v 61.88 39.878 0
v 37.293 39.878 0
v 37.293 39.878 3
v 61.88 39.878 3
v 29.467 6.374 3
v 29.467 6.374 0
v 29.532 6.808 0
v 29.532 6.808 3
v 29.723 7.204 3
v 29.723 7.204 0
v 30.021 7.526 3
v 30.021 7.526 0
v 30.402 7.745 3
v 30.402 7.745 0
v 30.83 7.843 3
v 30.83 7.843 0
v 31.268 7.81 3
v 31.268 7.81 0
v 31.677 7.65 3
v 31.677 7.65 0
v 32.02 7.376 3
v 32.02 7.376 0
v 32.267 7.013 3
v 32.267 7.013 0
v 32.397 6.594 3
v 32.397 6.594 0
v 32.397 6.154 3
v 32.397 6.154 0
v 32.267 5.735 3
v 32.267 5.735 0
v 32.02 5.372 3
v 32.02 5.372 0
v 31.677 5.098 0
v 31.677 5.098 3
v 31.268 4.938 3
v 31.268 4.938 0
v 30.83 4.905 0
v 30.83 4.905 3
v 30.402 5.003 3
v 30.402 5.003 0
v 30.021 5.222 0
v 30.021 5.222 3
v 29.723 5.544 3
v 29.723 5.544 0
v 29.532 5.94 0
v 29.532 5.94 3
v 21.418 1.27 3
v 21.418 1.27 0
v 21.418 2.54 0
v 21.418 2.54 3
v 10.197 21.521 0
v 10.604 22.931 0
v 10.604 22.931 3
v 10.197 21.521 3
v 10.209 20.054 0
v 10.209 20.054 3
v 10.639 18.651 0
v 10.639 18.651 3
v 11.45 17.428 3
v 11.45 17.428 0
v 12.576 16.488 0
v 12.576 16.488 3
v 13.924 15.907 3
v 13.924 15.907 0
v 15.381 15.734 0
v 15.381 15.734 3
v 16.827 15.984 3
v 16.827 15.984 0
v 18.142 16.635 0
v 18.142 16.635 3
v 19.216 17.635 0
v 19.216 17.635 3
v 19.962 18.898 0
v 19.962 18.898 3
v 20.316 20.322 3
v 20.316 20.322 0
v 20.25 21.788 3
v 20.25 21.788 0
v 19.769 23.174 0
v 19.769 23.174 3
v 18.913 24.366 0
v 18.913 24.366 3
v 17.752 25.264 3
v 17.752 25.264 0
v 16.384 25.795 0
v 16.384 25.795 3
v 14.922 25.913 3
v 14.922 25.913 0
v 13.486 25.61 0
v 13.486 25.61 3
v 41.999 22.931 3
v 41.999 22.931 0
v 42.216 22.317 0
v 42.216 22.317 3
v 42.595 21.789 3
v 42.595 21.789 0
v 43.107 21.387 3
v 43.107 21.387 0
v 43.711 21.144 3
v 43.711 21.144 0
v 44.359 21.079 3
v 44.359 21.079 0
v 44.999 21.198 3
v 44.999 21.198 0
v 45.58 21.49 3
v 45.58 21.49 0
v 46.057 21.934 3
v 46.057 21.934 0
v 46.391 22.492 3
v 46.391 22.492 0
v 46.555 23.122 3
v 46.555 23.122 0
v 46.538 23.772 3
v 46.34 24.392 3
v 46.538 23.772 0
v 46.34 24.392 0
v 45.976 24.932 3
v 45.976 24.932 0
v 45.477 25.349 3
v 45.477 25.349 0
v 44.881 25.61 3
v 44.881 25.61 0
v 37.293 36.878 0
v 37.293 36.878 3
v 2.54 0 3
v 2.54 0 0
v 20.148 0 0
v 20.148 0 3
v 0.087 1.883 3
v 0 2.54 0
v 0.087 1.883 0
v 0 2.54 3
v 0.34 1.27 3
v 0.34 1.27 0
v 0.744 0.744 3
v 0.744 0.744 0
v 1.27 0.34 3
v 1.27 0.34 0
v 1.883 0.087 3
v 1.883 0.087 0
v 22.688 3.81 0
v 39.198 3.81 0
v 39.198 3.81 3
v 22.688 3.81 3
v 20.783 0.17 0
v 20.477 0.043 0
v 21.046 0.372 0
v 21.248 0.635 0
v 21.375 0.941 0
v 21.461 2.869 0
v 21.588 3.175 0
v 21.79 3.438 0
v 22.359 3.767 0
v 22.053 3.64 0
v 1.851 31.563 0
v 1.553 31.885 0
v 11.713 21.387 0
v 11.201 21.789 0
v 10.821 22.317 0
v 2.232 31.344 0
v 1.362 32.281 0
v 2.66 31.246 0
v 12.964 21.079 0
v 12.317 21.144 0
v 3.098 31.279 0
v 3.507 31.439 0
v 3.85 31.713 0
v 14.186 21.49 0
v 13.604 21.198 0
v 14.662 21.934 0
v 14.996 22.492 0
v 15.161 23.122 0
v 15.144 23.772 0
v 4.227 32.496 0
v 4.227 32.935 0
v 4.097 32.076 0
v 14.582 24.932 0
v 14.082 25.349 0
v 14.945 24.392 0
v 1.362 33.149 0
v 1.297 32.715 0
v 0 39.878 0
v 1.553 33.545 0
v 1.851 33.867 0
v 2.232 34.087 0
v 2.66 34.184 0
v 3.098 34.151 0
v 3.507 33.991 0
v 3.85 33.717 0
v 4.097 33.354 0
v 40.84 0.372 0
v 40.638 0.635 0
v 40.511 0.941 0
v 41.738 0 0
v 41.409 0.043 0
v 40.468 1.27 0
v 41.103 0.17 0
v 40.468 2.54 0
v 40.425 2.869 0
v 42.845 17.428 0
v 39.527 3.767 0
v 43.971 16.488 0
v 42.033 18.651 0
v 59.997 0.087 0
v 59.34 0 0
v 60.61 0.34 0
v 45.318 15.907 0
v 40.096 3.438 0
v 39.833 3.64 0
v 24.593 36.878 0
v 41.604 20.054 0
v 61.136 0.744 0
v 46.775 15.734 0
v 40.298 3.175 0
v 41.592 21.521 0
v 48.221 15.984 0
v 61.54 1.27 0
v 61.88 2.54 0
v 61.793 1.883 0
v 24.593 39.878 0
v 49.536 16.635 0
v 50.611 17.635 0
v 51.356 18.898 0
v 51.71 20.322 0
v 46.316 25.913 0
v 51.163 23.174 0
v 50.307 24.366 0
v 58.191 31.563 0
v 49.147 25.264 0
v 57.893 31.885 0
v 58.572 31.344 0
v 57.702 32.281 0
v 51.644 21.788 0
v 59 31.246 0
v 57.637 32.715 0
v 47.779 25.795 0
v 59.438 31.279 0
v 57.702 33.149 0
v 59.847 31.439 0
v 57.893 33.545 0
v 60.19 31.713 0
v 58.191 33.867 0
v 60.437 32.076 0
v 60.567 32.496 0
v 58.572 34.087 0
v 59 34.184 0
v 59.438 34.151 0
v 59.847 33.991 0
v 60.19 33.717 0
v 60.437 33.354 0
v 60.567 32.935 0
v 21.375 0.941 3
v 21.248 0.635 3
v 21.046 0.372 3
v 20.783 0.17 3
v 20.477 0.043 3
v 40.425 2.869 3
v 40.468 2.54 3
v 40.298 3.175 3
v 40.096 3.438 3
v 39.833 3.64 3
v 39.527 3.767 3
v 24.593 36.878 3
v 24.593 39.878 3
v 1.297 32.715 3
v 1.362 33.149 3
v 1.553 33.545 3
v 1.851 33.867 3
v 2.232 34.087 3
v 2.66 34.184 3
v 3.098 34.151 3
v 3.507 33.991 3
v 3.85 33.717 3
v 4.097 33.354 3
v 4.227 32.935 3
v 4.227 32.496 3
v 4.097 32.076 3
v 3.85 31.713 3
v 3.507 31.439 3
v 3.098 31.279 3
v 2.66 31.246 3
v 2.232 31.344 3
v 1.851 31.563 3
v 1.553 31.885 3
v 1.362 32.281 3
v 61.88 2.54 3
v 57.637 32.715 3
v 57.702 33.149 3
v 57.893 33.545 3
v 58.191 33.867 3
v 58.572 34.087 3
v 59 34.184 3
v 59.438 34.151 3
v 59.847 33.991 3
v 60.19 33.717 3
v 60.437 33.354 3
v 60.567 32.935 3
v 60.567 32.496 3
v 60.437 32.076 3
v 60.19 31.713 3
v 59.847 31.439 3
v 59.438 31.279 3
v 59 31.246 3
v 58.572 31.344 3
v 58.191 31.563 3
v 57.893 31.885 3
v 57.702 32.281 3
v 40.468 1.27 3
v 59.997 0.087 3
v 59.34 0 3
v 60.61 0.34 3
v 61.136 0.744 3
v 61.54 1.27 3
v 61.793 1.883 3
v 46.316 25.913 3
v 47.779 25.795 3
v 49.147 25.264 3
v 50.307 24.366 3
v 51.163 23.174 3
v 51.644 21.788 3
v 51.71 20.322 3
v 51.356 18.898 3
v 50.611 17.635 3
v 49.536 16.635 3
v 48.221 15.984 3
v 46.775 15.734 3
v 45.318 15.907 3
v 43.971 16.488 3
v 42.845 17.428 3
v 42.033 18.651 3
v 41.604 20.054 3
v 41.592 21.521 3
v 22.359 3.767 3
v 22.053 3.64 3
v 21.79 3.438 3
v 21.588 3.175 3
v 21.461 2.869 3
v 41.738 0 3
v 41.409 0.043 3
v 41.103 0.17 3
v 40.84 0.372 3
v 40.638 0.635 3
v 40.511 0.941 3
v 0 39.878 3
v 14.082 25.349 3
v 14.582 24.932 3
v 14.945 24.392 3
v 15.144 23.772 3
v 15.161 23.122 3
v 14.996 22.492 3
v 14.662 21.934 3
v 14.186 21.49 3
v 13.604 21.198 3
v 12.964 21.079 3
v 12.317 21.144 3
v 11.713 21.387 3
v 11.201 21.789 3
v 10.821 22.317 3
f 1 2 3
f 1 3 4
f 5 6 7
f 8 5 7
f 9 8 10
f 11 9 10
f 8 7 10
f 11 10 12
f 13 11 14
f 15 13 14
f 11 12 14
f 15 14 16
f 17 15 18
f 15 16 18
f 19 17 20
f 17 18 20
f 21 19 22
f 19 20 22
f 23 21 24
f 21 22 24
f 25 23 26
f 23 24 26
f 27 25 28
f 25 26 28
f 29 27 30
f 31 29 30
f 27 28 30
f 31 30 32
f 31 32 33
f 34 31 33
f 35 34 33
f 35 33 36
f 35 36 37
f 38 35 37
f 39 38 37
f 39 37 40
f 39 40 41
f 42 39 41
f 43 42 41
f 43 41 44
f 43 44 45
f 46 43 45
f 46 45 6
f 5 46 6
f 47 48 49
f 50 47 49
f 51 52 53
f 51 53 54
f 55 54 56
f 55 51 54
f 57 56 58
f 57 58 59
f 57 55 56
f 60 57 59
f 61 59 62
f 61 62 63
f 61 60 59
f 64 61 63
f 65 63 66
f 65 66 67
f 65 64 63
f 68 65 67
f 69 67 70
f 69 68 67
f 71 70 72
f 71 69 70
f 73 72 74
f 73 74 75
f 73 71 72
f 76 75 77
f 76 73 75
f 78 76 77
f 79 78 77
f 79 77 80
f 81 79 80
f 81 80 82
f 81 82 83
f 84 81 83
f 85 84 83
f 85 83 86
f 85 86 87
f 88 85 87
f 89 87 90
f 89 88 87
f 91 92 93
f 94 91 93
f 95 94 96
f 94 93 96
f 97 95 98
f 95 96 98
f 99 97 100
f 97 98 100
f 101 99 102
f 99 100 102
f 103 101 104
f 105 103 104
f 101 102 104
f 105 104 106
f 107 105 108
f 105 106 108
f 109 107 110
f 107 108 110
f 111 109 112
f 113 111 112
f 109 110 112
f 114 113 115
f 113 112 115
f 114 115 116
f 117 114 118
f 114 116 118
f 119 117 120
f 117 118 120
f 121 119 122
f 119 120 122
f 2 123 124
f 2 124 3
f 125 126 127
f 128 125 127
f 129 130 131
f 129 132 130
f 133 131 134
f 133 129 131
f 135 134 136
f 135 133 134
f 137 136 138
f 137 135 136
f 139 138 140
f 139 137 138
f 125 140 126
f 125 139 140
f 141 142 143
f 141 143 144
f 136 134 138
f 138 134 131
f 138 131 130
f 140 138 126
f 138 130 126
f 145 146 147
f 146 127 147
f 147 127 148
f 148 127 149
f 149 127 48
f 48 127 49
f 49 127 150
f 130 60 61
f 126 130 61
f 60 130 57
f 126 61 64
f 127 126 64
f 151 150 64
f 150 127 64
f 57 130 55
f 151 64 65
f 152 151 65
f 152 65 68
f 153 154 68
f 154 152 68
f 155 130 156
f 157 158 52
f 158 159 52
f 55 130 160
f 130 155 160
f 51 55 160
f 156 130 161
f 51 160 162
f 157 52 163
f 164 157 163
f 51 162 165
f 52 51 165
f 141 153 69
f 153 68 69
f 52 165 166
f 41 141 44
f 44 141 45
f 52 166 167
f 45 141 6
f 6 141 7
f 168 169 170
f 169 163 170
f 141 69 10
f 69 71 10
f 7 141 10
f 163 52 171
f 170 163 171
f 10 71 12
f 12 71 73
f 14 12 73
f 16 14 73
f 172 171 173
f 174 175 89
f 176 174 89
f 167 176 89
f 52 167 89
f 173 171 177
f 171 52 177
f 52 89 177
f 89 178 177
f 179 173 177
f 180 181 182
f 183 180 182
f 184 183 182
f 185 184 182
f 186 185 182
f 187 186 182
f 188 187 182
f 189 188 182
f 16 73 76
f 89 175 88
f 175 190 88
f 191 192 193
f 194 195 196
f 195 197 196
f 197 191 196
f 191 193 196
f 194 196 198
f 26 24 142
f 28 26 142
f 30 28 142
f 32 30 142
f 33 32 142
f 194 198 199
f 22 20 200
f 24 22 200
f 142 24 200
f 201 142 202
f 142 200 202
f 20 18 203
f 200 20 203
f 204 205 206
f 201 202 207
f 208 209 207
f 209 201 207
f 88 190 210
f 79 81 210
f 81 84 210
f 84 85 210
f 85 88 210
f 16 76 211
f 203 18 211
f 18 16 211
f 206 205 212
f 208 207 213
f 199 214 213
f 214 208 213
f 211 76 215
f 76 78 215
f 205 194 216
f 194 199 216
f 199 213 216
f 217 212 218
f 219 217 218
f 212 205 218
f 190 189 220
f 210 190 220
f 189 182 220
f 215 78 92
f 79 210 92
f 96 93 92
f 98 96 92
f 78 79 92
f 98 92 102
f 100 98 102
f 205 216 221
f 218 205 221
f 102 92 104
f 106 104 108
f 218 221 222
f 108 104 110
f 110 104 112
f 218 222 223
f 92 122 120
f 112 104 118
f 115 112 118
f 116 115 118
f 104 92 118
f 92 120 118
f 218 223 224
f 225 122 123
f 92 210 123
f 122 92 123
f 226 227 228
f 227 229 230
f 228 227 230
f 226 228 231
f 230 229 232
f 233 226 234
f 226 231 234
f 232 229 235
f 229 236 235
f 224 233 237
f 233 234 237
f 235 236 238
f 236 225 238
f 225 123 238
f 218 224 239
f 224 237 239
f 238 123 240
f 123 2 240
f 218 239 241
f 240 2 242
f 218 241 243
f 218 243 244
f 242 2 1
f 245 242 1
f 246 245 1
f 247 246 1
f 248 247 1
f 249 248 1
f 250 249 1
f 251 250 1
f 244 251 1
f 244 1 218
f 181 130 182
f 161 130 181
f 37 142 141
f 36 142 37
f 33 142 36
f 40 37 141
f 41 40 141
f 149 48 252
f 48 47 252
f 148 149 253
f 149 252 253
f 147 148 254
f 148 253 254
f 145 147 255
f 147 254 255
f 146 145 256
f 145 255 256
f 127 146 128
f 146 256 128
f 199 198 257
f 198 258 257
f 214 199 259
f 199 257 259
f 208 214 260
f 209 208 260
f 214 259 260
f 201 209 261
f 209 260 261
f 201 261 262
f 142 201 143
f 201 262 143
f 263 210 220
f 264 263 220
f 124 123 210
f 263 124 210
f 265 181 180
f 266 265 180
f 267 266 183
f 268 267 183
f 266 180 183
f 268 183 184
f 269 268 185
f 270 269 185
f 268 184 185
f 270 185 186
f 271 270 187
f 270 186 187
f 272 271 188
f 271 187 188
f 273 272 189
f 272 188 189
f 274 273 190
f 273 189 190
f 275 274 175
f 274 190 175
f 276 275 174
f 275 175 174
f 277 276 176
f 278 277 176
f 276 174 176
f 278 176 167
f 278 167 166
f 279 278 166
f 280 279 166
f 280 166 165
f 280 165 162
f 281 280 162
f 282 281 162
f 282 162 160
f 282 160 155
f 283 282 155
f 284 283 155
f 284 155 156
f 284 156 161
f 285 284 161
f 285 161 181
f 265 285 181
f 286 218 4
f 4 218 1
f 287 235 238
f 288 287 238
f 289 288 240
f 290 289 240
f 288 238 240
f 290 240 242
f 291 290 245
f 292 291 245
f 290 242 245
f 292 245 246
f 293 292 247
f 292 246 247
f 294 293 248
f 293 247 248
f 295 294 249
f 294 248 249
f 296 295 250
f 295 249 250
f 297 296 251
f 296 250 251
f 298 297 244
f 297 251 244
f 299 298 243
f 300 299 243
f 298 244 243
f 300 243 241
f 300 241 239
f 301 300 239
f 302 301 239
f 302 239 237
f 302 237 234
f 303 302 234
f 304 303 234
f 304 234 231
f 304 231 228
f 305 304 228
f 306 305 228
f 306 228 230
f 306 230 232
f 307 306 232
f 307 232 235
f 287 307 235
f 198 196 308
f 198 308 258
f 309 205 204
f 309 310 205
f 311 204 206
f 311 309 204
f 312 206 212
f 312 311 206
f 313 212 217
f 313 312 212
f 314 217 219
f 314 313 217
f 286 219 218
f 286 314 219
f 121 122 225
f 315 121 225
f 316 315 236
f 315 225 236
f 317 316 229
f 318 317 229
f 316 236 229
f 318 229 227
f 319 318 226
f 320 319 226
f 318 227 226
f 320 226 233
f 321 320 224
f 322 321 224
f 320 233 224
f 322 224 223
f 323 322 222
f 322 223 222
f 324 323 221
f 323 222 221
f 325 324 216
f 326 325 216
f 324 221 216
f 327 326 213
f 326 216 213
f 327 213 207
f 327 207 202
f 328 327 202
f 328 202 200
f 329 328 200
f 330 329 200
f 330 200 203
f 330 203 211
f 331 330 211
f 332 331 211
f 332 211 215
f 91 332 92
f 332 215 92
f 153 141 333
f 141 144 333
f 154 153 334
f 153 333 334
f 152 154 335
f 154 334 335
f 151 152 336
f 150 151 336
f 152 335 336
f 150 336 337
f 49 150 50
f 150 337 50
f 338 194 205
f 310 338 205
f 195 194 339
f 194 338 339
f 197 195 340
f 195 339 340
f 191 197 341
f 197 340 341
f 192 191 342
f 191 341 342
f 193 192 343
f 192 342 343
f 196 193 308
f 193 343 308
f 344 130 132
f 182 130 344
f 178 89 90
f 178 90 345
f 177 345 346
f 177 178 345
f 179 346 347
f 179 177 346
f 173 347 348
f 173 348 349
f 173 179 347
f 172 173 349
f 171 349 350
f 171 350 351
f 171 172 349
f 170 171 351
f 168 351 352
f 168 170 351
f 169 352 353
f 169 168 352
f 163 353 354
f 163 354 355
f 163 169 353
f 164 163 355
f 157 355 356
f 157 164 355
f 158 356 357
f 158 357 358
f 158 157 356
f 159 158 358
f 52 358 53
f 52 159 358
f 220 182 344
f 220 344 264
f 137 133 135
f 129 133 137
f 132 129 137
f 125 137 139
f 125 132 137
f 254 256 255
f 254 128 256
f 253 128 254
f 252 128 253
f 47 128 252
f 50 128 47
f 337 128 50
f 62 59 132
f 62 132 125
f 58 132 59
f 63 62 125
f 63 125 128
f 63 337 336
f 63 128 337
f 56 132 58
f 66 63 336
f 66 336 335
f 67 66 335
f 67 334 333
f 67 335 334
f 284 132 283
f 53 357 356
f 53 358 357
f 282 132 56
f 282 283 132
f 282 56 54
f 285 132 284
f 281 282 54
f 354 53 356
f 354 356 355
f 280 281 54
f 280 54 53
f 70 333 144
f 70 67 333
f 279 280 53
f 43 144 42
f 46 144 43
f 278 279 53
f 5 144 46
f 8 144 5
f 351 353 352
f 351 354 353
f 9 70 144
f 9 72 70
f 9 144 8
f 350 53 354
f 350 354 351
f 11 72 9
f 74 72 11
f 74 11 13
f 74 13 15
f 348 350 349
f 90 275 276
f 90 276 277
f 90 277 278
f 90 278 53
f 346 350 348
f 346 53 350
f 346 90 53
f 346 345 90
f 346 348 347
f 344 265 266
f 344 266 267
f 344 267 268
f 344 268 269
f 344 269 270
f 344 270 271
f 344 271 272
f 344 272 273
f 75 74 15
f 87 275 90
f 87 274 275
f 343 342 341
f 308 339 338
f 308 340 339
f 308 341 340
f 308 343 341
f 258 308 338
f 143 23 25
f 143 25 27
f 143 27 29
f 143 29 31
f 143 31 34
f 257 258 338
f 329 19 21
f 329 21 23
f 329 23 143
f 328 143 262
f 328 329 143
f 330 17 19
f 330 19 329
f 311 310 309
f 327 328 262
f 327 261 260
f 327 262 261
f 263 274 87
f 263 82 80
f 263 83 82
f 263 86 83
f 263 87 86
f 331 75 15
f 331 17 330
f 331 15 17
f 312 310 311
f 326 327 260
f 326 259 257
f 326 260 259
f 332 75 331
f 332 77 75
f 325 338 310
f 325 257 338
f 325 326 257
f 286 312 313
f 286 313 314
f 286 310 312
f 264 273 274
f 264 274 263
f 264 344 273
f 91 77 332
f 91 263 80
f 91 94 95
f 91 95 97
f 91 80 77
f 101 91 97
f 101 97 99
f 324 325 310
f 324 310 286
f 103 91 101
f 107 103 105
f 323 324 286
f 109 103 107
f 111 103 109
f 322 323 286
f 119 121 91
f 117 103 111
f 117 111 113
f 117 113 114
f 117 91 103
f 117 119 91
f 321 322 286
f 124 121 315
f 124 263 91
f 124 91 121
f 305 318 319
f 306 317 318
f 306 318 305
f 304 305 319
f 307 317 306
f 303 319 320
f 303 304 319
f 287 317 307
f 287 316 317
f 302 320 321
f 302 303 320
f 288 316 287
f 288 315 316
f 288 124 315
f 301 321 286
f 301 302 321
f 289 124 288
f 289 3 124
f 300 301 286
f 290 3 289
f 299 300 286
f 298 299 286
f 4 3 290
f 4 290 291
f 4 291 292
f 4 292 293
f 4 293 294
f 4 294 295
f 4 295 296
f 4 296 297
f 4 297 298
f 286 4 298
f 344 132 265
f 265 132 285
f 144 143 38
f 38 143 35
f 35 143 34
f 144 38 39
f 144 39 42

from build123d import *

# Parameters (mm, degrees)
SKETCH1_W                   = 61.88
SKETCH1_H                   = 39.878
BOSS_EXTRUDE1_DEPTH         = 3
F_32_0_116_DIAMETER_HOLE1_D = 2.9464
FILLET1_R                   = 2.54
SKETCH6_W                   = 12.7
SKETCH6_H                   = 3
CUT_EXTRUDE1_DEPTH          = 3
SKETCH7_W                   = 19.05
SKETCH7_H                   = 3.81
CUT_EXTRUDE2_DEPTH          = 74.67760368
FILLET2_R                   = 1.27
CUT_EXTRUDE4_DEPTH          = 3


with BuildPart() as part:
    # Sketch1 → Boss-Extrude1 (new body)
    with BuildSketch(Plane.XY):
        with Locations((30.94, 19.939)):
            Rectangle(SKETCH1_W, SKETCH1_H)
    extrude(amount=BOSS_EXTRUDE1_DEPTH)

    # #32 (0.116) Diameter Hole1 (through all)
    with Locations(Plane.XY.offset(3)):
        with Locations((30.94, 6.373999952), (59.11, 32.7152), (2.77, 32.7152)):
            Hole(F_32_0_116_DIAMETER_HOLE1_D / 2)

    # Fillet1
    fillet1_edges = [part.edges().sort_by_distance(p)[0] for p in [
        (61.88, 0, 1.5),
        (0, 0, 1.5),
    ]]
    fillet(fillet1_edges, radius=FILLET1_R)

    # Sketch6 → Cut-Extrude1 (cut)
    with BuildSketch(Plane(origin=(0, 0, 0), x_dir=(-1, 0, 0), z_dir=(0, 0, -1))):
        with Locations((-30.9428, 38.378)):
            Rectangle(SKETCH6_W, SKETCH6_H)
    extrude(amount=-CUT_EXTRUDE1_DEPTH, mode=Mode.SUBTRACT)

    # Sketch7 → Cut-Extrude2 (cut, through all)
    with BuildSketch(Plane(origin=(0, 0, 0), x_dir=(-1, 0, 0), z_dir=(0, 0, -1))):
        with Locations((-30.9428, 1.905)):
            Rectangle(SKETCH7_W, SKETCH7_H)
    extrude(amount=-CUT_EXTRUDE2_DEPTH, mode=Mode.SUBTRACT)

    # Fillet2
    fillet2_edges = [part.edges().sort_by_distance(p)[0] for p in [
        (40.4678, 0, 1.5),
        (40.4678, 3.81, 1.5),
        (21.4178, 3.81, 1.5),
        (21.4178, 0, 1.5),
    ]]
    fillet(fillet2_edges, radius=FILLET2_R)

    # Sketch10 → Cut-Extrude4 (cut)
    with BuildSketch(Plane(origin=(0, 0, 0), x_dir=(-1, 0, 0), z_dir=(0, 0, -1))):
        with BuildLine():
            ThreePointArc((-10.60427198, 22.930843482), (-18.715027328, 17.096117028), (-13.486198066, 25.610089641))
            ThreePointArc((-13.486198066, 25.610089641), (-14.439521527, 21.695056792), (-10.60427198, 22.930843482))
        make_face()
        with BuildLine():
            ThreePointArc((-41.99867198, 22.930843482), (-45.833921527, 21.695056792), (-44.880598066, 25.610089641))
            ThreePointArc((-44.880598066, 25.610089641), (-50.109427328, 17.096117028), (-41.99867198, 22.930843482))
        make_face()
    extrude(amount=-CUT_EXTRUDE4_DEPTH, mode=Mode.SUBTRACT)


solid = part.part
